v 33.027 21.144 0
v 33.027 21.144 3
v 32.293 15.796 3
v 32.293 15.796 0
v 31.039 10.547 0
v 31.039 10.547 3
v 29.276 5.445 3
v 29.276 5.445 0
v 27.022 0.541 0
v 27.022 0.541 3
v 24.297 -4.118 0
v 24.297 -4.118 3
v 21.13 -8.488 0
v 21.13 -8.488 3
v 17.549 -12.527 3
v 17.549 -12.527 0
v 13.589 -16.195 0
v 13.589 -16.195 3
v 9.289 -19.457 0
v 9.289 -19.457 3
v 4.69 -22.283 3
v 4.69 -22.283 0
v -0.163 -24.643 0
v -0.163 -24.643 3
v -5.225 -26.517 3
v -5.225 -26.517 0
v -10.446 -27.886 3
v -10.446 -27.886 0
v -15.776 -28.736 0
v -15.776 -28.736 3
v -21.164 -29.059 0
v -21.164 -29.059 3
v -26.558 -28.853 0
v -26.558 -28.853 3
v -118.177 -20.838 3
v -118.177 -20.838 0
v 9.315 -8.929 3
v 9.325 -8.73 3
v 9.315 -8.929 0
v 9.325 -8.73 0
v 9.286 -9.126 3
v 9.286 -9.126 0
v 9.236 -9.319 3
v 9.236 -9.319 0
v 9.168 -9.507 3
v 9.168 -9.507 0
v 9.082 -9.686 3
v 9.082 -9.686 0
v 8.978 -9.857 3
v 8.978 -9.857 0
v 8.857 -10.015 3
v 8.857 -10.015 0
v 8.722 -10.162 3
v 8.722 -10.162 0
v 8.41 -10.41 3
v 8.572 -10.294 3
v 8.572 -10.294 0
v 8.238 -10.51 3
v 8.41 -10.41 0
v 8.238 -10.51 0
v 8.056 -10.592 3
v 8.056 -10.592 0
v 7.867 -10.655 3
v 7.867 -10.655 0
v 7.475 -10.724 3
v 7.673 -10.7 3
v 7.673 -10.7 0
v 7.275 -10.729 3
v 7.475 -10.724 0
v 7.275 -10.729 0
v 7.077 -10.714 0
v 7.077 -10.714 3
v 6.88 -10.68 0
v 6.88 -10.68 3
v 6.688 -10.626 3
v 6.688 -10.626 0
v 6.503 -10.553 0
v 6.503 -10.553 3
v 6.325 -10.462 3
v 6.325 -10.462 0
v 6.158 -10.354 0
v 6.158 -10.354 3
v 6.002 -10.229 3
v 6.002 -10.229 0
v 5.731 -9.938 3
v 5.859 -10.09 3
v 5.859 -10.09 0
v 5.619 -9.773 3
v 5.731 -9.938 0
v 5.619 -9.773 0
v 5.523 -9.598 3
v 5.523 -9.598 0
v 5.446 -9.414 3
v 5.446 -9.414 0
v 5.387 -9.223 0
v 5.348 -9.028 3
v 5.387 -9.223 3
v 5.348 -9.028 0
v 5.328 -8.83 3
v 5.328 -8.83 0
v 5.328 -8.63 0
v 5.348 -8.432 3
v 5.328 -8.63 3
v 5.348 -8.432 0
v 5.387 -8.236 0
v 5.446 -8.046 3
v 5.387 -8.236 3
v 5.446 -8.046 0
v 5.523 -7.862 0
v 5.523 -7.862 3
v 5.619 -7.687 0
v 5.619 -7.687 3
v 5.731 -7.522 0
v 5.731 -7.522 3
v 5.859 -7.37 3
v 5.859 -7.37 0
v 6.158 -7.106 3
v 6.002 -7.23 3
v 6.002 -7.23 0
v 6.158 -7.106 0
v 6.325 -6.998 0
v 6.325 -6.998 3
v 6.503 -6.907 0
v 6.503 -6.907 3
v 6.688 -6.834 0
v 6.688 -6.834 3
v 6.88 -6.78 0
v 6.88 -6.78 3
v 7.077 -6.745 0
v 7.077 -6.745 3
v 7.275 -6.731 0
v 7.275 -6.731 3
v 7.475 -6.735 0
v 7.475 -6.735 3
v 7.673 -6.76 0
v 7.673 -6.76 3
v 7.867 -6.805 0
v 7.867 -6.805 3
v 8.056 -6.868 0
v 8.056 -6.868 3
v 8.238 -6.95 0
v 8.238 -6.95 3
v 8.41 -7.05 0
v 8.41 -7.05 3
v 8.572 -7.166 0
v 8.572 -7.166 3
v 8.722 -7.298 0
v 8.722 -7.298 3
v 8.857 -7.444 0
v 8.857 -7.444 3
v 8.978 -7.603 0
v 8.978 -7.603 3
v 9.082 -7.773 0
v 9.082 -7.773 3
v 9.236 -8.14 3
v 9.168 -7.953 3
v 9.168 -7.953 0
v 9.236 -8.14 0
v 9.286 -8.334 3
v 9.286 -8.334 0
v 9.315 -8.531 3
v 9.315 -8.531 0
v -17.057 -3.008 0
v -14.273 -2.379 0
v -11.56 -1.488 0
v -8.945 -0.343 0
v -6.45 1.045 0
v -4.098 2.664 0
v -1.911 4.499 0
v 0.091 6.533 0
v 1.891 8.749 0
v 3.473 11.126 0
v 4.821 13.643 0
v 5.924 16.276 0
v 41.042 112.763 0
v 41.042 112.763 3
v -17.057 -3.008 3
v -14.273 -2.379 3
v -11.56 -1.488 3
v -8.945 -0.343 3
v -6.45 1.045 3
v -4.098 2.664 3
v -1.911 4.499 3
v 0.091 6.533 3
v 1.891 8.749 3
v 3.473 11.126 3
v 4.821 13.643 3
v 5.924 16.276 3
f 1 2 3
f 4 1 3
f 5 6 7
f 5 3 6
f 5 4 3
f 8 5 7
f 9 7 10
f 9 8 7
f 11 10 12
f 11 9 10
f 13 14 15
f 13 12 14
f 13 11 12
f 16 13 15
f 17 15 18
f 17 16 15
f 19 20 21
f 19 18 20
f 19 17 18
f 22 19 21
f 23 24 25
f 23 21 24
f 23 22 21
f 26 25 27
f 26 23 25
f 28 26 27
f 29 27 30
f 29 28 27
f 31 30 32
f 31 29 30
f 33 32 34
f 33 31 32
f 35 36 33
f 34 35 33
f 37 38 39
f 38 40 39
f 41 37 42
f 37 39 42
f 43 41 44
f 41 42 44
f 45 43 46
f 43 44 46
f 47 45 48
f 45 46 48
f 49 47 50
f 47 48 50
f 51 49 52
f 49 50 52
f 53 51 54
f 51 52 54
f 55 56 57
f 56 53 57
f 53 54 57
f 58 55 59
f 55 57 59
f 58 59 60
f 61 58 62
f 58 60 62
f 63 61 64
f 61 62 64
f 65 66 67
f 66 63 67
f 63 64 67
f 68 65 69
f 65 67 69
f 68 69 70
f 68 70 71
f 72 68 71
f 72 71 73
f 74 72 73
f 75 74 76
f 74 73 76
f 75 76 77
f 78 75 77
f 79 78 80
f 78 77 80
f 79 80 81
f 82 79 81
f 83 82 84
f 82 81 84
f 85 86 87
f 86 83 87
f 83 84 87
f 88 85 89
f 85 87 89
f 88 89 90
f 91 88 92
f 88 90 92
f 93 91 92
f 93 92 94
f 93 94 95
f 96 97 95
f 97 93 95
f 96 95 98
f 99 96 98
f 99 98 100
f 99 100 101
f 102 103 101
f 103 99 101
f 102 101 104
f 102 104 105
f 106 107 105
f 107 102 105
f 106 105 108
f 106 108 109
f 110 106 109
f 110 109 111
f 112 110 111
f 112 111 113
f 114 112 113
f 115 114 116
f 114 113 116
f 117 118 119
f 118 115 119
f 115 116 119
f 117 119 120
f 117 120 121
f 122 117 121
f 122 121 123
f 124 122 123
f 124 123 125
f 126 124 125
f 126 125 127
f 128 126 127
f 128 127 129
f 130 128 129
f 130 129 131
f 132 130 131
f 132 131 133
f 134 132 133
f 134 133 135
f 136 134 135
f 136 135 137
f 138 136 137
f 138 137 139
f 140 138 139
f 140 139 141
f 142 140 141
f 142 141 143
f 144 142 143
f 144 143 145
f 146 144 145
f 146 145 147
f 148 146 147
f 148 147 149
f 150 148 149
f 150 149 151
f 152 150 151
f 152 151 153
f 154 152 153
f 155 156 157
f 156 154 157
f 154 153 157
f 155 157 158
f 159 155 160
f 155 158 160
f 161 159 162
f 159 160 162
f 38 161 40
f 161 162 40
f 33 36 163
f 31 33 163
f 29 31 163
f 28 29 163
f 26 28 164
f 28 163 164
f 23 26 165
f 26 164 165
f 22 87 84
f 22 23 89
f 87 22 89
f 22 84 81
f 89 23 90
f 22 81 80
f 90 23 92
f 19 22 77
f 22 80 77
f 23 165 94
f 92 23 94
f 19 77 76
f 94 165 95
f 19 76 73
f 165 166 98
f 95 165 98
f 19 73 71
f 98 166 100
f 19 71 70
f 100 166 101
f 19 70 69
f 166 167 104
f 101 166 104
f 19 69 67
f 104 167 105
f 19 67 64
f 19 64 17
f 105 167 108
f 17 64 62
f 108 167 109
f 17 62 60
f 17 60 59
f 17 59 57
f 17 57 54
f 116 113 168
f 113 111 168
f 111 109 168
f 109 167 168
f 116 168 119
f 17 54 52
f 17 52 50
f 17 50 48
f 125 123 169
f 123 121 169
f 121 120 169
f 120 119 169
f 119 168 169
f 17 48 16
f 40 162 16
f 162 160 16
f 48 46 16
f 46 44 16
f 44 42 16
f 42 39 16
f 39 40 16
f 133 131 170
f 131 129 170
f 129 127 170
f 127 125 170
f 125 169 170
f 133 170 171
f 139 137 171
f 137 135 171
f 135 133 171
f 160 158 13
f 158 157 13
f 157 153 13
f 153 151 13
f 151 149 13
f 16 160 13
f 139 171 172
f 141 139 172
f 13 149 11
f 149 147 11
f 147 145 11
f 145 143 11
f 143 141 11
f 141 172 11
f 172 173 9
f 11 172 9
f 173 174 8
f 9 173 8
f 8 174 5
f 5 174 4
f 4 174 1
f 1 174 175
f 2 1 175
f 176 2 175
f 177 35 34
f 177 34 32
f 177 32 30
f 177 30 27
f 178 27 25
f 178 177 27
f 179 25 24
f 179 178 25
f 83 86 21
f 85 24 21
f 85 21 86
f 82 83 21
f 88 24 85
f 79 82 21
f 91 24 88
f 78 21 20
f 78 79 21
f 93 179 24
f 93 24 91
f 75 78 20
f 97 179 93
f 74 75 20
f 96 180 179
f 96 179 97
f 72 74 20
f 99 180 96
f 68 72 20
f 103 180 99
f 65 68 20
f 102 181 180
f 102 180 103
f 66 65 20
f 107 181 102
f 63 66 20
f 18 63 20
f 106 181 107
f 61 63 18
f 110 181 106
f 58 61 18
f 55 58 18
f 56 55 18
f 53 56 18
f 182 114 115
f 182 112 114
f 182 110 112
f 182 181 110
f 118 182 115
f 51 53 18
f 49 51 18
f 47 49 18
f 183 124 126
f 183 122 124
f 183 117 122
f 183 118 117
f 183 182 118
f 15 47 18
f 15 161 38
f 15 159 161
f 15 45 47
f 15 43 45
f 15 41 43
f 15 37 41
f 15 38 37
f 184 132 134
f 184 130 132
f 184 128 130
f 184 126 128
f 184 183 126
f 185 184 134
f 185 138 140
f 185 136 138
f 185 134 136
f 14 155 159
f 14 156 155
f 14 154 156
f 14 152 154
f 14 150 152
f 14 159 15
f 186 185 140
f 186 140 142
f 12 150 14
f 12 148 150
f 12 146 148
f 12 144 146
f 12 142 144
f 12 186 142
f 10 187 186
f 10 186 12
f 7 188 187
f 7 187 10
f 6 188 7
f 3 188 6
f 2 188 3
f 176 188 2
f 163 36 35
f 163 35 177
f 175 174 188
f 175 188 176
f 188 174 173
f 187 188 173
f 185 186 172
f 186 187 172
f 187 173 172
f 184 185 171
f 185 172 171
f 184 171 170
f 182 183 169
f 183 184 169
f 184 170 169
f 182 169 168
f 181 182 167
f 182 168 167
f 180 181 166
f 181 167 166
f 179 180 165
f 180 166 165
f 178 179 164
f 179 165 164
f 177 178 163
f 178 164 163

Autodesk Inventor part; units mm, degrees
ref_plane "YZ Plane" through (0, 0, 0) normal (1, 0, 0) x (0, 1, 0)
ref_plane "XZ Plane" through (0, 0, 0) normal (0, 1, 0) x (-1, 0, 0)
ref_plane "XY Plane" through (0, 0, 0) normal (0, 0, 1) x (1, 0, 0)
sketch "草圖1" plane through (0, 0, 0) normal (0, 0, 1) x (1, 0, 0)
  arc A0 (-17.0574, -3.0077) -> (5.924, 16.276) centre (-22.2668, 26.5366) ccw
  line L0 (5.924, 16.276) -> (41.0424, 112.7631)
  line L1 (-118.1769, -20.8378) -> (-17.0574, -3.0077)
  line L2 (-118.1769, -20.8378) -> (-26.5575, -28.8534)
  arc A1 (-26.5575, -28.8534) -> (33.0268, 21.1437) centre (-21.764, 25.9373) ccw
  line L3 (33.0268, 21.1437) -> (41.0424, 112.7631)
  circle A2 centre (7.3253, -8.7299) radius 2
  point P0 (0, 0)
  dimension "d0" = 55
  dimension "d1" = 4
  dimension "d2" = 23
  dimension "d3" = 23
extrude "擠出1" add sketch "草圖1" along normal blind 3
sketch "草圖2" plane through (0, 0, 3) normal (0, 0, 1) x (1, 0, 0)
  arc A0 (-26.5575, -28.8534) -> (33.0268, 21.1437) centre (-21.764, 25.9373) ccw projected
  line L0 (33.0268, 21.1437) -> (41.0424, 112.7631) projected
  line L1 (41.0424, 112.7631) -> (5.924, 16.276) projected
  arc A1 (-17.0574, -3.0077) -> (5.924, 16.276) centre (-22.2668, 26.5366) ccw projected
  line L2 (-17.0574, -3.0077) -> (-118.1769, -20.8378) projected
  line L3 (-118.1769, -20.8378) -> (-26.5575, -28.8534) projected
  circle A2 centre (7.3253, -8.7299) radius 2 projected
  point P0 (0, 0)
equation "\"d3\" = d2"
properties part number "sus_1"
